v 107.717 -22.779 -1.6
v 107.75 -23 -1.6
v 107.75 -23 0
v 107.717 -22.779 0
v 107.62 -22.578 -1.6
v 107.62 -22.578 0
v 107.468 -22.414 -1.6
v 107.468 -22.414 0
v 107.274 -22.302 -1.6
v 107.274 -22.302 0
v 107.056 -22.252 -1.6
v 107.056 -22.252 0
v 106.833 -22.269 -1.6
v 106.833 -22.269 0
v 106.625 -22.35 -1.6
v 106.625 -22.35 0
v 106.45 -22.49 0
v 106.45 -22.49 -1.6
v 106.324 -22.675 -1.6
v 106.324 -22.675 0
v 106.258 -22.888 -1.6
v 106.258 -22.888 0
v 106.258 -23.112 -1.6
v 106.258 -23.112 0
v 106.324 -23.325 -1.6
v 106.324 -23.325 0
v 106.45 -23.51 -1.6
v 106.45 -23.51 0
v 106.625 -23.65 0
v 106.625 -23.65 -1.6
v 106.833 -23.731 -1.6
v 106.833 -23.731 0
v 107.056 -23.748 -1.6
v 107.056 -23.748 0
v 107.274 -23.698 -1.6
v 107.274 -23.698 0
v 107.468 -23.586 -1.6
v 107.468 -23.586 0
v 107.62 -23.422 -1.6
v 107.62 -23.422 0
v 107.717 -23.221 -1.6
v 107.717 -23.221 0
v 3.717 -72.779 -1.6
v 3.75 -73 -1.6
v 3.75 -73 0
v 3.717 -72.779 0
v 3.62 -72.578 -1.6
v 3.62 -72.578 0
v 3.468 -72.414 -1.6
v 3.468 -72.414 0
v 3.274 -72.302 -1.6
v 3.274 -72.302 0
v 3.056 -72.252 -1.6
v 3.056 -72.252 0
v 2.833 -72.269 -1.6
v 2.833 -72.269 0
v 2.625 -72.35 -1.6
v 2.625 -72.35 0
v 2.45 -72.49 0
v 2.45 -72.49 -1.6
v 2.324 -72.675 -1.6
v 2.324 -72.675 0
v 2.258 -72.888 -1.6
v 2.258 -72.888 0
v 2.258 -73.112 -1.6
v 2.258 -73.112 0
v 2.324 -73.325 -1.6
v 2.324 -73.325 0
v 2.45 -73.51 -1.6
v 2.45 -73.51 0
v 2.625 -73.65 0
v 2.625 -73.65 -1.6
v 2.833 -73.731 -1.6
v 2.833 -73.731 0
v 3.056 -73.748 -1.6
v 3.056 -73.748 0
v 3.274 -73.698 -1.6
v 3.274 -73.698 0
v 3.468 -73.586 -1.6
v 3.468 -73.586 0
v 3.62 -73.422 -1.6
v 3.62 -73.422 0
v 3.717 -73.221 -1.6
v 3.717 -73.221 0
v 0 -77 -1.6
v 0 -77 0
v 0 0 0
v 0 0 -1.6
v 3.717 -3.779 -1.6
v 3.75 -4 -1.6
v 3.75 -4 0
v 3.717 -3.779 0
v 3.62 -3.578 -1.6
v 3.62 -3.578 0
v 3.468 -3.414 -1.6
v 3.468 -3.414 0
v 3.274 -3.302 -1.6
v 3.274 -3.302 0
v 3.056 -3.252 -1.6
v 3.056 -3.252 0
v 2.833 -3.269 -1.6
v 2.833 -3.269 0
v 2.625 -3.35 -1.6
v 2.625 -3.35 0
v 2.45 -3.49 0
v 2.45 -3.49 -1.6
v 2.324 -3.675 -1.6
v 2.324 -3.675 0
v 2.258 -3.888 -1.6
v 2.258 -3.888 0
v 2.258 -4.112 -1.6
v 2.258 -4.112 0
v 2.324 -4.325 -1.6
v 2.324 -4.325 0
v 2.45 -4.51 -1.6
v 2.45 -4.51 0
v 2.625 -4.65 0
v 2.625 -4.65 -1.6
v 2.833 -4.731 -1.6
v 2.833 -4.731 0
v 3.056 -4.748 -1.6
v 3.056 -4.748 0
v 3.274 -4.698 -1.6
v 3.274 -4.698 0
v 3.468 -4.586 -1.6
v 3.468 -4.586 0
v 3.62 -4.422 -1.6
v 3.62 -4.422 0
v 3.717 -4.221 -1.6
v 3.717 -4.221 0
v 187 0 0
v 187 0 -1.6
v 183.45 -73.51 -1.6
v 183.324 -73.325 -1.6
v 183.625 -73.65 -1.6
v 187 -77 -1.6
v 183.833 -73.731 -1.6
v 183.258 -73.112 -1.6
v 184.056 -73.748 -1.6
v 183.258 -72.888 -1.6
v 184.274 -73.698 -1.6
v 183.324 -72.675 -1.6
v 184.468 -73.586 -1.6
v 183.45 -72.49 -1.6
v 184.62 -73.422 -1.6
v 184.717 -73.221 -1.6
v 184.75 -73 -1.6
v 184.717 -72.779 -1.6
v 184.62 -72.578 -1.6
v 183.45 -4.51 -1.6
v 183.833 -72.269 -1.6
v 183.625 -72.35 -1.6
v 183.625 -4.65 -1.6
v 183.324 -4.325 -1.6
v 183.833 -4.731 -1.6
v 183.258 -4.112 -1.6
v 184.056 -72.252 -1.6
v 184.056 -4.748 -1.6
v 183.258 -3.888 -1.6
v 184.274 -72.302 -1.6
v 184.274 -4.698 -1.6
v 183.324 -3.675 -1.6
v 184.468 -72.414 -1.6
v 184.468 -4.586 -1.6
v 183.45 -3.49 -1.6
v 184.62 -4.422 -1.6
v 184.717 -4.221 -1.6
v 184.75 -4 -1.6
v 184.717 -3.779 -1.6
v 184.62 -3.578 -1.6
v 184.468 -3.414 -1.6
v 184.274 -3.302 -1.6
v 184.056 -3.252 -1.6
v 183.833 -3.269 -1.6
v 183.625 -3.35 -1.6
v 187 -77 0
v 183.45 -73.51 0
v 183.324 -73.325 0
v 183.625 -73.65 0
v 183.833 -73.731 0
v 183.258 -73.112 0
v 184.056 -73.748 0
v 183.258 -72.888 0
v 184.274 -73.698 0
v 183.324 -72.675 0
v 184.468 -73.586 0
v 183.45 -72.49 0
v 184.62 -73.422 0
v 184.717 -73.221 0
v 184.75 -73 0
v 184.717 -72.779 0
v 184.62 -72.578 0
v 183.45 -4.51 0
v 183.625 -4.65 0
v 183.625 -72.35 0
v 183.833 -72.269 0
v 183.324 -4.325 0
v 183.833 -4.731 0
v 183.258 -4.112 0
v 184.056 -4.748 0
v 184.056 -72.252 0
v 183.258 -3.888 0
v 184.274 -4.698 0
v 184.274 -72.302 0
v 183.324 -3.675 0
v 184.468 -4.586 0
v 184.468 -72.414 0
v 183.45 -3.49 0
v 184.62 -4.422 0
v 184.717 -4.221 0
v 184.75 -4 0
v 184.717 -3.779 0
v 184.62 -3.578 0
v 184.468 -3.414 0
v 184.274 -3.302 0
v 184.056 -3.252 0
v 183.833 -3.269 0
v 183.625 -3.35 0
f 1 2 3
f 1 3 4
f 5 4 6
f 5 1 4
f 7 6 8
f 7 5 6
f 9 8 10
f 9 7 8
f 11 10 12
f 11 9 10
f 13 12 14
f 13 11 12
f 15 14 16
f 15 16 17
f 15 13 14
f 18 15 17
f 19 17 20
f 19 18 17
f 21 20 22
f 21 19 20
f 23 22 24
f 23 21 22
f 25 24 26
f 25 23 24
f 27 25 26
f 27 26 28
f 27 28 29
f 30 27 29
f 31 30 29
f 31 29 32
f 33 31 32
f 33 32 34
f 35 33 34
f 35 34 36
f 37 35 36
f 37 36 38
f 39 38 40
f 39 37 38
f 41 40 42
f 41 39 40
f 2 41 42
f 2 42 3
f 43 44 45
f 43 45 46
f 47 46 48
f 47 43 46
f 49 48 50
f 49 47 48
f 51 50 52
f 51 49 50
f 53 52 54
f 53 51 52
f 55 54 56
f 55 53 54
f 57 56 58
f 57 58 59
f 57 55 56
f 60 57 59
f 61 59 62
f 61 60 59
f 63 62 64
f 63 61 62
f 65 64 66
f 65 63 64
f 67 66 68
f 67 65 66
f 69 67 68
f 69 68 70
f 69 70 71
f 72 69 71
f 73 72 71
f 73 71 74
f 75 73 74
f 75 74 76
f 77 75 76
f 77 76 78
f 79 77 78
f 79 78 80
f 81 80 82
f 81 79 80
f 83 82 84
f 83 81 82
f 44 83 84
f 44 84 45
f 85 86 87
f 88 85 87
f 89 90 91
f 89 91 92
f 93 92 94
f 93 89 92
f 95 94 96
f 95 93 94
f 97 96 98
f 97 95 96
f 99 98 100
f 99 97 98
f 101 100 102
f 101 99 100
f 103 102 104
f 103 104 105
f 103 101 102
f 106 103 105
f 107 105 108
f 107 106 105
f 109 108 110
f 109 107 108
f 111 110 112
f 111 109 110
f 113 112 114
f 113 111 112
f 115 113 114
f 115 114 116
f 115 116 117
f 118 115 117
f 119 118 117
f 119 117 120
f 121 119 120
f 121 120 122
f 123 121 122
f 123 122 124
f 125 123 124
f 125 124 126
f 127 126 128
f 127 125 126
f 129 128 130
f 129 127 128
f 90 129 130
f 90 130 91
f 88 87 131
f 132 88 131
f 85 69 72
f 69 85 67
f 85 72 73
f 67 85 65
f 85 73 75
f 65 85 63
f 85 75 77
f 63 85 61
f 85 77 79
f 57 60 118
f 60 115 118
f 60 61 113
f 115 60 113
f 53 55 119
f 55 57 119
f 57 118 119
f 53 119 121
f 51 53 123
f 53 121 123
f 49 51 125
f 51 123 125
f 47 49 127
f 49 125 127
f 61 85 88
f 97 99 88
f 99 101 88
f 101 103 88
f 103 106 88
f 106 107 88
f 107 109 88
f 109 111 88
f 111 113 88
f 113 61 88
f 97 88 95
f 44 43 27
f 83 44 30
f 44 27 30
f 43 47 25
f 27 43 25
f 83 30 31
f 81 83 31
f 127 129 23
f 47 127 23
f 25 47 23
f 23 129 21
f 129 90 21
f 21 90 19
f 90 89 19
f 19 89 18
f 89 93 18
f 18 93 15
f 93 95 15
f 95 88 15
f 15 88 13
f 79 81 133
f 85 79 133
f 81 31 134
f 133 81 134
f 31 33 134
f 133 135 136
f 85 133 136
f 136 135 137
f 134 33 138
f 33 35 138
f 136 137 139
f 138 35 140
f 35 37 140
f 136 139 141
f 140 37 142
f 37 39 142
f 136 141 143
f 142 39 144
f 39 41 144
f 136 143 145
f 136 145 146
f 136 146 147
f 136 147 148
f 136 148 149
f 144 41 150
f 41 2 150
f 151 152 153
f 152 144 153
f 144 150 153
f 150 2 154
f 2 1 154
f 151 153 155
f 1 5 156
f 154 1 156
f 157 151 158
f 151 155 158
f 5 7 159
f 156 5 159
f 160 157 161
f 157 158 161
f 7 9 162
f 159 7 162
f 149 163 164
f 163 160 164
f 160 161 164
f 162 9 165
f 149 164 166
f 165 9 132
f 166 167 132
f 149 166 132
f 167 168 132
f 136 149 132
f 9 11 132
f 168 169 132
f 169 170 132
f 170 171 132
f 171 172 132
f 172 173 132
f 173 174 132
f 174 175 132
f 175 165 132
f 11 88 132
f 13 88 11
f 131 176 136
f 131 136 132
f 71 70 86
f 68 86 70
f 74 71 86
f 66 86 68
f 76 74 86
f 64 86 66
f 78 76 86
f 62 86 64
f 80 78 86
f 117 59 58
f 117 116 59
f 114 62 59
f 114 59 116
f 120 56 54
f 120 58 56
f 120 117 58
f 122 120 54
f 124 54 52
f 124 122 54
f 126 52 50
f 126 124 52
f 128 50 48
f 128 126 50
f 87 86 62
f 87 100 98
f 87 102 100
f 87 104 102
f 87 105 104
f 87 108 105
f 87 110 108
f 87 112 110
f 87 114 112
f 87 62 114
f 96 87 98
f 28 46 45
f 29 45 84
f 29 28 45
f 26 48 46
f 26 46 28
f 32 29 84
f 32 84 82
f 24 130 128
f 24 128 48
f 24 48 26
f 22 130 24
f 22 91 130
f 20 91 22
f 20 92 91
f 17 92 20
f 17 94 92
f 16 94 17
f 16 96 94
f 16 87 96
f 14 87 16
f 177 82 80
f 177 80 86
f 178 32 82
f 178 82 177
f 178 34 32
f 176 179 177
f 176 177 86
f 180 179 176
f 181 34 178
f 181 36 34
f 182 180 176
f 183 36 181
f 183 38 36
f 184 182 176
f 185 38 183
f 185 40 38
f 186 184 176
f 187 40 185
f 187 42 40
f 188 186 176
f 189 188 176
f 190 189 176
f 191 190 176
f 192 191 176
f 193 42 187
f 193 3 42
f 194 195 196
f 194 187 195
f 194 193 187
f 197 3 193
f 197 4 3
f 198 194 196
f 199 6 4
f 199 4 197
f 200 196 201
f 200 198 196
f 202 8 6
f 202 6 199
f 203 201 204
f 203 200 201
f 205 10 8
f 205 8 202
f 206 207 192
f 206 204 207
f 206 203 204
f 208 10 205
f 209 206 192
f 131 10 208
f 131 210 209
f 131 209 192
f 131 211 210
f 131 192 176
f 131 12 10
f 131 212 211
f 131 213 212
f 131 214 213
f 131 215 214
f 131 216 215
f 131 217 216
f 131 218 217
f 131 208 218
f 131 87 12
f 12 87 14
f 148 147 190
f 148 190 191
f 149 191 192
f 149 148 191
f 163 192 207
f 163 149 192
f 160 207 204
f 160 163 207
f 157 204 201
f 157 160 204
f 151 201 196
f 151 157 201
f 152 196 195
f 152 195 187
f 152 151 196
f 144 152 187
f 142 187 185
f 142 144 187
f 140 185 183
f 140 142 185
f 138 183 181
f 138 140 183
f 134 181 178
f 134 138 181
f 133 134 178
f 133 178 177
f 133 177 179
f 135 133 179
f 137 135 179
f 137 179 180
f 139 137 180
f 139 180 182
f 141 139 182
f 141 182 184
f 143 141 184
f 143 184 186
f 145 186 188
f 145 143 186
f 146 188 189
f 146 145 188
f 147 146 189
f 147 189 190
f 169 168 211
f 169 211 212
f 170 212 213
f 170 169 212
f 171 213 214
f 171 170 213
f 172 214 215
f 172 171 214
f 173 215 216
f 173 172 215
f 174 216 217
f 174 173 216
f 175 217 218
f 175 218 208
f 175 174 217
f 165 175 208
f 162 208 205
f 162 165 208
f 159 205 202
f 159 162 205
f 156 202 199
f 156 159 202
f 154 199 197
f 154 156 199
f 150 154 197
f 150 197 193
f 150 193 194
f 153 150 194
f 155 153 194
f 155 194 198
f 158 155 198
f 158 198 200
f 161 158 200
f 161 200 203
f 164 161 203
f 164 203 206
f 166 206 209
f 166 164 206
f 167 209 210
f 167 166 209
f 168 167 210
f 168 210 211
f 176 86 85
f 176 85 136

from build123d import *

# Parameters (mm, degrees)
KEEPOUTLAYER_W          = 186.99999938
KEEPOUTLAYER_H          = 77.00000094
EXTRUDE_1_DEPTH         = 1.6
CUT_EXTRUDE_START       = -1.6
CUT_EXTRUDE_1_OUTLINE_R = 0.7499985
CUT_EXTRUDE_1_DEPTH     = 1.6


# Read off the part's stored shape, not the designer's step: Вырез-Вытянуть1
with BuildPart() as part:
    # KeepOutLayer → Бобышка-Вытянуть1 (new body)
    with BuildSketch(Plane.XY):
        with Locations((93.49999969, -38.50000047)):
            Rectangle(KEEPOUTLAYER_W, KEEPOUTLAYER_H)
    extrude(amount=-EXTRUDE_1_DEPTH)

    # Вырез-Вытянуть1 outline → Вырез-Вытянуть1 (cut)
    with BuildSketch(Plane.XY.offset(CUT_EXTRUDE_START)):
        with Locations((184.0000003, -3.99999962)):
            Circle(CUT_EXTRUDE_1_OUTLINE_R)
        with Locations((106.99999936, -22.99999972)):
            Circle(CUT_EXTRUDE_1_OUTLINE_R)
        with Locations((3.00000162, -73.00000132)):
            Circle(CUT_EXTRUDE_1_OUTLINE_R)
        with Locations((3.00000162, -3.99999962)):
            Circle(CUT_EXTRUDE_1_OUTLINE_R)
        with Locations((184.0000003, -73.00000132)):
            Circle(CUT_EXTRUDE_1_OUTLINE_R)
    extrude(amount=CUT_EXTRUDE_1_DEPTH, mode=Mode.SUBTRACT)


solid = part.part
